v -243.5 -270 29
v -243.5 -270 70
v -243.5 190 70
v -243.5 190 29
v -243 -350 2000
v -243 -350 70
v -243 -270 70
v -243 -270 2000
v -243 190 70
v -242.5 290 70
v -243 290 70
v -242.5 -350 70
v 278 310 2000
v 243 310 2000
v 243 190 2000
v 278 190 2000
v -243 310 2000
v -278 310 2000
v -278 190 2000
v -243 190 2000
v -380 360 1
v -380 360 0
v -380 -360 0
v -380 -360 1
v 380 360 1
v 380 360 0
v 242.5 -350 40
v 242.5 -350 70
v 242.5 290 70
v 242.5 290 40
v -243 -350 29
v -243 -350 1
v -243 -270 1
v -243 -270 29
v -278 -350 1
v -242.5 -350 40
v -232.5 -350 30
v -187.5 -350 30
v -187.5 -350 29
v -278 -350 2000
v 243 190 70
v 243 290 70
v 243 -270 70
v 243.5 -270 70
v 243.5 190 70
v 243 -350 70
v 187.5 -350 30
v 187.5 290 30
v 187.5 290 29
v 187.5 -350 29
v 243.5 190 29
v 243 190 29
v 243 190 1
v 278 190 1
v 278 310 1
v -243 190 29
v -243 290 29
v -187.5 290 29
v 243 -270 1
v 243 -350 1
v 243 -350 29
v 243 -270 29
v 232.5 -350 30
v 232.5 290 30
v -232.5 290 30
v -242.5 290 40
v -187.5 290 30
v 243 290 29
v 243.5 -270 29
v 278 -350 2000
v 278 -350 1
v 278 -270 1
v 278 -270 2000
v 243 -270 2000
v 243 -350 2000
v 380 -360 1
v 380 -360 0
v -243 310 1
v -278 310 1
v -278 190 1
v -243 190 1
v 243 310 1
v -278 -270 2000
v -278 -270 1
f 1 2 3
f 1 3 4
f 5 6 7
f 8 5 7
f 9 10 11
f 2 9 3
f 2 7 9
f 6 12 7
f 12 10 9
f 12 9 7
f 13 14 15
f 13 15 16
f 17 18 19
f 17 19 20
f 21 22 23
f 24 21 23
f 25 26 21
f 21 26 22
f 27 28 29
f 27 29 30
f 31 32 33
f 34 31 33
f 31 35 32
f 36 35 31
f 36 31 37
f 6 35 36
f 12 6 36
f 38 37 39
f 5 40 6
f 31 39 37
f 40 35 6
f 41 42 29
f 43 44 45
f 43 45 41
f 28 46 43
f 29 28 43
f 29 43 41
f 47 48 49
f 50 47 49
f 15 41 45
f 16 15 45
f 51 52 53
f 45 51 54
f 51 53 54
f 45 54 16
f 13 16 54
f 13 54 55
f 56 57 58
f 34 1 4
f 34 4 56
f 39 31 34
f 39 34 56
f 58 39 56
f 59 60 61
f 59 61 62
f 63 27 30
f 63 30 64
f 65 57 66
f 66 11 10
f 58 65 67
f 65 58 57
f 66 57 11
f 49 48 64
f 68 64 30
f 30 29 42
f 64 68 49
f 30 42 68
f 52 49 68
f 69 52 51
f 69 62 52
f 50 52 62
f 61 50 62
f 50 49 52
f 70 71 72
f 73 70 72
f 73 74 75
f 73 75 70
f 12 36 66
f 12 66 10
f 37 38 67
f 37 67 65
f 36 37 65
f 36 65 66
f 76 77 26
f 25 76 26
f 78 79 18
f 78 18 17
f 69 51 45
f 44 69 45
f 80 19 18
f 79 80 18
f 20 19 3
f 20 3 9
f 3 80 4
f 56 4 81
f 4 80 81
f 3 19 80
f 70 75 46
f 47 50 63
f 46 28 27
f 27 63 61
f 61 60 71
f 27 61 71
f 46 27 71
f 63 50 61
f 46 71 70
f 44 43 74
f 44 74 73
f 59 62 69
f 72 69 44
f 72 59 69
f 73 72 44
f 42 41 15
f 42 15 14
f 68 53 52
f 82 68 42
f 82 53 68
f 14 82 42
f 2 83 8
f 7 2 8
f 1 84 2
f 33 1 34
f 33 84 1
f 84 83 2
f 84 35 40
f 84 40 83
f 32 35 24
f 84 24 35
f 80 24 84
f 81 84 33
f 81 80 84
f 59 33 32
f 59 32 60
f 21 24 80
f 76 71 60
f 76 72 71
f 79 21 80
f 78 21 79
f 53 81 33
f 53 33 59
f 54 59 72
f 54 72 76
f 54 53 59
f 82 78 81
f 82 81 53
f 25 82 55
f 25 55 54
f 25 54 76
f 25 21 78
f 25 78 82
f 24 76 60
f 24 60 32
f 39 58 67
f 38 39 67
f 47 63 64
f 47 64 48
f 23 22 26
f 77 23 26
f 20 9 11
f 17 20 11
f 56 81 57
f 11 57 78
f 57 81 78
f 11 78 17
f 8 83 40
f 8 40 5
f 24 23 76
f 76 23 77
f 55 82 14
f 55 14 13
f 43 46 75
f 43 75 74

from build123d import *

# Parameters (mm, degrees)
F0_W     = 35
F0_H     = 80
F0_H_2   = 120
F2_DEPTH = 1
F4_DEPTH = 2000
F5_DEPTH = 640


# Not quite as in the source:
# - a feature names something its author has since deleted; it is built from what else it names


with BuildPart() as f2:
    # F0 (on Top) → F2 (new body)
    with BuildSketch(Plane.XY):
        Polygon((380, 360), (-380, 360), (-380, -360), (0, -360), (380, -360), align=None)
        with Locations((-260.5, -310)):
            Rectangle(F0_W, F0_H, mode=Mode.SUBTRACT)
        with Locations((260.5, -310)):
            Rectangle(F0_W, F0_H, mode=Mode.SUBTRACT)
        with Locations((-260.5, 250)):
            Rectangle(F0_W, F0_H_2, mode=Mode.SUBTRACT)
        with Locations((260.5, 250)):
            Rectangle(F0_W, F0_H_2, mode=Mode.SUBTRACT)
    extrude(amount=F2_DEPTH)

    # F0 (on Top) → F4 (join)
    with BuildSketch(Plane.XY):
        with Locations((-260.5, 250)):
            Rectangle(F0_W, F0_H_2)
        with Locations((-260.5, -310)):
            Rectangle(F0_W, F0_H)
        with Locations((260.5, -310)):
            Rectangle(F0_W, F0_H)
        with Locations((260.5, 250)):
            Rectangle(F0_W, F0_H_2)
    extrude(amount=F4_DEPTH)

    # F3 (on offset) → F5 (join)
    with BuildSketch(Plane.XZ.offset(350)):
        Polygon((-187.5, 29), (-187.5, 30), (-232.5, 30), (-242.5, 30), (-242.5, 40), (-242.5, 70), (-243.5, 70), (-243.5, 30), (-243.5, 29), align=None)
        Polygon((-242.5, 30), (-232.5, 30), (-242.5, 40), align=None)
        Polygon((242.5, 40), (232.5, 30), (242.5, 30), align=None)
        Polygon((232.5, 30), (187.5, 30), (187.5, 29), (243.5, 29), (243.5, 30), (243.5, 70), (242.5, 70), (242.5, 40), (242.5, 30), align=None)
    extrude(amount=-F5_DEPTH)


solid = f2.part
